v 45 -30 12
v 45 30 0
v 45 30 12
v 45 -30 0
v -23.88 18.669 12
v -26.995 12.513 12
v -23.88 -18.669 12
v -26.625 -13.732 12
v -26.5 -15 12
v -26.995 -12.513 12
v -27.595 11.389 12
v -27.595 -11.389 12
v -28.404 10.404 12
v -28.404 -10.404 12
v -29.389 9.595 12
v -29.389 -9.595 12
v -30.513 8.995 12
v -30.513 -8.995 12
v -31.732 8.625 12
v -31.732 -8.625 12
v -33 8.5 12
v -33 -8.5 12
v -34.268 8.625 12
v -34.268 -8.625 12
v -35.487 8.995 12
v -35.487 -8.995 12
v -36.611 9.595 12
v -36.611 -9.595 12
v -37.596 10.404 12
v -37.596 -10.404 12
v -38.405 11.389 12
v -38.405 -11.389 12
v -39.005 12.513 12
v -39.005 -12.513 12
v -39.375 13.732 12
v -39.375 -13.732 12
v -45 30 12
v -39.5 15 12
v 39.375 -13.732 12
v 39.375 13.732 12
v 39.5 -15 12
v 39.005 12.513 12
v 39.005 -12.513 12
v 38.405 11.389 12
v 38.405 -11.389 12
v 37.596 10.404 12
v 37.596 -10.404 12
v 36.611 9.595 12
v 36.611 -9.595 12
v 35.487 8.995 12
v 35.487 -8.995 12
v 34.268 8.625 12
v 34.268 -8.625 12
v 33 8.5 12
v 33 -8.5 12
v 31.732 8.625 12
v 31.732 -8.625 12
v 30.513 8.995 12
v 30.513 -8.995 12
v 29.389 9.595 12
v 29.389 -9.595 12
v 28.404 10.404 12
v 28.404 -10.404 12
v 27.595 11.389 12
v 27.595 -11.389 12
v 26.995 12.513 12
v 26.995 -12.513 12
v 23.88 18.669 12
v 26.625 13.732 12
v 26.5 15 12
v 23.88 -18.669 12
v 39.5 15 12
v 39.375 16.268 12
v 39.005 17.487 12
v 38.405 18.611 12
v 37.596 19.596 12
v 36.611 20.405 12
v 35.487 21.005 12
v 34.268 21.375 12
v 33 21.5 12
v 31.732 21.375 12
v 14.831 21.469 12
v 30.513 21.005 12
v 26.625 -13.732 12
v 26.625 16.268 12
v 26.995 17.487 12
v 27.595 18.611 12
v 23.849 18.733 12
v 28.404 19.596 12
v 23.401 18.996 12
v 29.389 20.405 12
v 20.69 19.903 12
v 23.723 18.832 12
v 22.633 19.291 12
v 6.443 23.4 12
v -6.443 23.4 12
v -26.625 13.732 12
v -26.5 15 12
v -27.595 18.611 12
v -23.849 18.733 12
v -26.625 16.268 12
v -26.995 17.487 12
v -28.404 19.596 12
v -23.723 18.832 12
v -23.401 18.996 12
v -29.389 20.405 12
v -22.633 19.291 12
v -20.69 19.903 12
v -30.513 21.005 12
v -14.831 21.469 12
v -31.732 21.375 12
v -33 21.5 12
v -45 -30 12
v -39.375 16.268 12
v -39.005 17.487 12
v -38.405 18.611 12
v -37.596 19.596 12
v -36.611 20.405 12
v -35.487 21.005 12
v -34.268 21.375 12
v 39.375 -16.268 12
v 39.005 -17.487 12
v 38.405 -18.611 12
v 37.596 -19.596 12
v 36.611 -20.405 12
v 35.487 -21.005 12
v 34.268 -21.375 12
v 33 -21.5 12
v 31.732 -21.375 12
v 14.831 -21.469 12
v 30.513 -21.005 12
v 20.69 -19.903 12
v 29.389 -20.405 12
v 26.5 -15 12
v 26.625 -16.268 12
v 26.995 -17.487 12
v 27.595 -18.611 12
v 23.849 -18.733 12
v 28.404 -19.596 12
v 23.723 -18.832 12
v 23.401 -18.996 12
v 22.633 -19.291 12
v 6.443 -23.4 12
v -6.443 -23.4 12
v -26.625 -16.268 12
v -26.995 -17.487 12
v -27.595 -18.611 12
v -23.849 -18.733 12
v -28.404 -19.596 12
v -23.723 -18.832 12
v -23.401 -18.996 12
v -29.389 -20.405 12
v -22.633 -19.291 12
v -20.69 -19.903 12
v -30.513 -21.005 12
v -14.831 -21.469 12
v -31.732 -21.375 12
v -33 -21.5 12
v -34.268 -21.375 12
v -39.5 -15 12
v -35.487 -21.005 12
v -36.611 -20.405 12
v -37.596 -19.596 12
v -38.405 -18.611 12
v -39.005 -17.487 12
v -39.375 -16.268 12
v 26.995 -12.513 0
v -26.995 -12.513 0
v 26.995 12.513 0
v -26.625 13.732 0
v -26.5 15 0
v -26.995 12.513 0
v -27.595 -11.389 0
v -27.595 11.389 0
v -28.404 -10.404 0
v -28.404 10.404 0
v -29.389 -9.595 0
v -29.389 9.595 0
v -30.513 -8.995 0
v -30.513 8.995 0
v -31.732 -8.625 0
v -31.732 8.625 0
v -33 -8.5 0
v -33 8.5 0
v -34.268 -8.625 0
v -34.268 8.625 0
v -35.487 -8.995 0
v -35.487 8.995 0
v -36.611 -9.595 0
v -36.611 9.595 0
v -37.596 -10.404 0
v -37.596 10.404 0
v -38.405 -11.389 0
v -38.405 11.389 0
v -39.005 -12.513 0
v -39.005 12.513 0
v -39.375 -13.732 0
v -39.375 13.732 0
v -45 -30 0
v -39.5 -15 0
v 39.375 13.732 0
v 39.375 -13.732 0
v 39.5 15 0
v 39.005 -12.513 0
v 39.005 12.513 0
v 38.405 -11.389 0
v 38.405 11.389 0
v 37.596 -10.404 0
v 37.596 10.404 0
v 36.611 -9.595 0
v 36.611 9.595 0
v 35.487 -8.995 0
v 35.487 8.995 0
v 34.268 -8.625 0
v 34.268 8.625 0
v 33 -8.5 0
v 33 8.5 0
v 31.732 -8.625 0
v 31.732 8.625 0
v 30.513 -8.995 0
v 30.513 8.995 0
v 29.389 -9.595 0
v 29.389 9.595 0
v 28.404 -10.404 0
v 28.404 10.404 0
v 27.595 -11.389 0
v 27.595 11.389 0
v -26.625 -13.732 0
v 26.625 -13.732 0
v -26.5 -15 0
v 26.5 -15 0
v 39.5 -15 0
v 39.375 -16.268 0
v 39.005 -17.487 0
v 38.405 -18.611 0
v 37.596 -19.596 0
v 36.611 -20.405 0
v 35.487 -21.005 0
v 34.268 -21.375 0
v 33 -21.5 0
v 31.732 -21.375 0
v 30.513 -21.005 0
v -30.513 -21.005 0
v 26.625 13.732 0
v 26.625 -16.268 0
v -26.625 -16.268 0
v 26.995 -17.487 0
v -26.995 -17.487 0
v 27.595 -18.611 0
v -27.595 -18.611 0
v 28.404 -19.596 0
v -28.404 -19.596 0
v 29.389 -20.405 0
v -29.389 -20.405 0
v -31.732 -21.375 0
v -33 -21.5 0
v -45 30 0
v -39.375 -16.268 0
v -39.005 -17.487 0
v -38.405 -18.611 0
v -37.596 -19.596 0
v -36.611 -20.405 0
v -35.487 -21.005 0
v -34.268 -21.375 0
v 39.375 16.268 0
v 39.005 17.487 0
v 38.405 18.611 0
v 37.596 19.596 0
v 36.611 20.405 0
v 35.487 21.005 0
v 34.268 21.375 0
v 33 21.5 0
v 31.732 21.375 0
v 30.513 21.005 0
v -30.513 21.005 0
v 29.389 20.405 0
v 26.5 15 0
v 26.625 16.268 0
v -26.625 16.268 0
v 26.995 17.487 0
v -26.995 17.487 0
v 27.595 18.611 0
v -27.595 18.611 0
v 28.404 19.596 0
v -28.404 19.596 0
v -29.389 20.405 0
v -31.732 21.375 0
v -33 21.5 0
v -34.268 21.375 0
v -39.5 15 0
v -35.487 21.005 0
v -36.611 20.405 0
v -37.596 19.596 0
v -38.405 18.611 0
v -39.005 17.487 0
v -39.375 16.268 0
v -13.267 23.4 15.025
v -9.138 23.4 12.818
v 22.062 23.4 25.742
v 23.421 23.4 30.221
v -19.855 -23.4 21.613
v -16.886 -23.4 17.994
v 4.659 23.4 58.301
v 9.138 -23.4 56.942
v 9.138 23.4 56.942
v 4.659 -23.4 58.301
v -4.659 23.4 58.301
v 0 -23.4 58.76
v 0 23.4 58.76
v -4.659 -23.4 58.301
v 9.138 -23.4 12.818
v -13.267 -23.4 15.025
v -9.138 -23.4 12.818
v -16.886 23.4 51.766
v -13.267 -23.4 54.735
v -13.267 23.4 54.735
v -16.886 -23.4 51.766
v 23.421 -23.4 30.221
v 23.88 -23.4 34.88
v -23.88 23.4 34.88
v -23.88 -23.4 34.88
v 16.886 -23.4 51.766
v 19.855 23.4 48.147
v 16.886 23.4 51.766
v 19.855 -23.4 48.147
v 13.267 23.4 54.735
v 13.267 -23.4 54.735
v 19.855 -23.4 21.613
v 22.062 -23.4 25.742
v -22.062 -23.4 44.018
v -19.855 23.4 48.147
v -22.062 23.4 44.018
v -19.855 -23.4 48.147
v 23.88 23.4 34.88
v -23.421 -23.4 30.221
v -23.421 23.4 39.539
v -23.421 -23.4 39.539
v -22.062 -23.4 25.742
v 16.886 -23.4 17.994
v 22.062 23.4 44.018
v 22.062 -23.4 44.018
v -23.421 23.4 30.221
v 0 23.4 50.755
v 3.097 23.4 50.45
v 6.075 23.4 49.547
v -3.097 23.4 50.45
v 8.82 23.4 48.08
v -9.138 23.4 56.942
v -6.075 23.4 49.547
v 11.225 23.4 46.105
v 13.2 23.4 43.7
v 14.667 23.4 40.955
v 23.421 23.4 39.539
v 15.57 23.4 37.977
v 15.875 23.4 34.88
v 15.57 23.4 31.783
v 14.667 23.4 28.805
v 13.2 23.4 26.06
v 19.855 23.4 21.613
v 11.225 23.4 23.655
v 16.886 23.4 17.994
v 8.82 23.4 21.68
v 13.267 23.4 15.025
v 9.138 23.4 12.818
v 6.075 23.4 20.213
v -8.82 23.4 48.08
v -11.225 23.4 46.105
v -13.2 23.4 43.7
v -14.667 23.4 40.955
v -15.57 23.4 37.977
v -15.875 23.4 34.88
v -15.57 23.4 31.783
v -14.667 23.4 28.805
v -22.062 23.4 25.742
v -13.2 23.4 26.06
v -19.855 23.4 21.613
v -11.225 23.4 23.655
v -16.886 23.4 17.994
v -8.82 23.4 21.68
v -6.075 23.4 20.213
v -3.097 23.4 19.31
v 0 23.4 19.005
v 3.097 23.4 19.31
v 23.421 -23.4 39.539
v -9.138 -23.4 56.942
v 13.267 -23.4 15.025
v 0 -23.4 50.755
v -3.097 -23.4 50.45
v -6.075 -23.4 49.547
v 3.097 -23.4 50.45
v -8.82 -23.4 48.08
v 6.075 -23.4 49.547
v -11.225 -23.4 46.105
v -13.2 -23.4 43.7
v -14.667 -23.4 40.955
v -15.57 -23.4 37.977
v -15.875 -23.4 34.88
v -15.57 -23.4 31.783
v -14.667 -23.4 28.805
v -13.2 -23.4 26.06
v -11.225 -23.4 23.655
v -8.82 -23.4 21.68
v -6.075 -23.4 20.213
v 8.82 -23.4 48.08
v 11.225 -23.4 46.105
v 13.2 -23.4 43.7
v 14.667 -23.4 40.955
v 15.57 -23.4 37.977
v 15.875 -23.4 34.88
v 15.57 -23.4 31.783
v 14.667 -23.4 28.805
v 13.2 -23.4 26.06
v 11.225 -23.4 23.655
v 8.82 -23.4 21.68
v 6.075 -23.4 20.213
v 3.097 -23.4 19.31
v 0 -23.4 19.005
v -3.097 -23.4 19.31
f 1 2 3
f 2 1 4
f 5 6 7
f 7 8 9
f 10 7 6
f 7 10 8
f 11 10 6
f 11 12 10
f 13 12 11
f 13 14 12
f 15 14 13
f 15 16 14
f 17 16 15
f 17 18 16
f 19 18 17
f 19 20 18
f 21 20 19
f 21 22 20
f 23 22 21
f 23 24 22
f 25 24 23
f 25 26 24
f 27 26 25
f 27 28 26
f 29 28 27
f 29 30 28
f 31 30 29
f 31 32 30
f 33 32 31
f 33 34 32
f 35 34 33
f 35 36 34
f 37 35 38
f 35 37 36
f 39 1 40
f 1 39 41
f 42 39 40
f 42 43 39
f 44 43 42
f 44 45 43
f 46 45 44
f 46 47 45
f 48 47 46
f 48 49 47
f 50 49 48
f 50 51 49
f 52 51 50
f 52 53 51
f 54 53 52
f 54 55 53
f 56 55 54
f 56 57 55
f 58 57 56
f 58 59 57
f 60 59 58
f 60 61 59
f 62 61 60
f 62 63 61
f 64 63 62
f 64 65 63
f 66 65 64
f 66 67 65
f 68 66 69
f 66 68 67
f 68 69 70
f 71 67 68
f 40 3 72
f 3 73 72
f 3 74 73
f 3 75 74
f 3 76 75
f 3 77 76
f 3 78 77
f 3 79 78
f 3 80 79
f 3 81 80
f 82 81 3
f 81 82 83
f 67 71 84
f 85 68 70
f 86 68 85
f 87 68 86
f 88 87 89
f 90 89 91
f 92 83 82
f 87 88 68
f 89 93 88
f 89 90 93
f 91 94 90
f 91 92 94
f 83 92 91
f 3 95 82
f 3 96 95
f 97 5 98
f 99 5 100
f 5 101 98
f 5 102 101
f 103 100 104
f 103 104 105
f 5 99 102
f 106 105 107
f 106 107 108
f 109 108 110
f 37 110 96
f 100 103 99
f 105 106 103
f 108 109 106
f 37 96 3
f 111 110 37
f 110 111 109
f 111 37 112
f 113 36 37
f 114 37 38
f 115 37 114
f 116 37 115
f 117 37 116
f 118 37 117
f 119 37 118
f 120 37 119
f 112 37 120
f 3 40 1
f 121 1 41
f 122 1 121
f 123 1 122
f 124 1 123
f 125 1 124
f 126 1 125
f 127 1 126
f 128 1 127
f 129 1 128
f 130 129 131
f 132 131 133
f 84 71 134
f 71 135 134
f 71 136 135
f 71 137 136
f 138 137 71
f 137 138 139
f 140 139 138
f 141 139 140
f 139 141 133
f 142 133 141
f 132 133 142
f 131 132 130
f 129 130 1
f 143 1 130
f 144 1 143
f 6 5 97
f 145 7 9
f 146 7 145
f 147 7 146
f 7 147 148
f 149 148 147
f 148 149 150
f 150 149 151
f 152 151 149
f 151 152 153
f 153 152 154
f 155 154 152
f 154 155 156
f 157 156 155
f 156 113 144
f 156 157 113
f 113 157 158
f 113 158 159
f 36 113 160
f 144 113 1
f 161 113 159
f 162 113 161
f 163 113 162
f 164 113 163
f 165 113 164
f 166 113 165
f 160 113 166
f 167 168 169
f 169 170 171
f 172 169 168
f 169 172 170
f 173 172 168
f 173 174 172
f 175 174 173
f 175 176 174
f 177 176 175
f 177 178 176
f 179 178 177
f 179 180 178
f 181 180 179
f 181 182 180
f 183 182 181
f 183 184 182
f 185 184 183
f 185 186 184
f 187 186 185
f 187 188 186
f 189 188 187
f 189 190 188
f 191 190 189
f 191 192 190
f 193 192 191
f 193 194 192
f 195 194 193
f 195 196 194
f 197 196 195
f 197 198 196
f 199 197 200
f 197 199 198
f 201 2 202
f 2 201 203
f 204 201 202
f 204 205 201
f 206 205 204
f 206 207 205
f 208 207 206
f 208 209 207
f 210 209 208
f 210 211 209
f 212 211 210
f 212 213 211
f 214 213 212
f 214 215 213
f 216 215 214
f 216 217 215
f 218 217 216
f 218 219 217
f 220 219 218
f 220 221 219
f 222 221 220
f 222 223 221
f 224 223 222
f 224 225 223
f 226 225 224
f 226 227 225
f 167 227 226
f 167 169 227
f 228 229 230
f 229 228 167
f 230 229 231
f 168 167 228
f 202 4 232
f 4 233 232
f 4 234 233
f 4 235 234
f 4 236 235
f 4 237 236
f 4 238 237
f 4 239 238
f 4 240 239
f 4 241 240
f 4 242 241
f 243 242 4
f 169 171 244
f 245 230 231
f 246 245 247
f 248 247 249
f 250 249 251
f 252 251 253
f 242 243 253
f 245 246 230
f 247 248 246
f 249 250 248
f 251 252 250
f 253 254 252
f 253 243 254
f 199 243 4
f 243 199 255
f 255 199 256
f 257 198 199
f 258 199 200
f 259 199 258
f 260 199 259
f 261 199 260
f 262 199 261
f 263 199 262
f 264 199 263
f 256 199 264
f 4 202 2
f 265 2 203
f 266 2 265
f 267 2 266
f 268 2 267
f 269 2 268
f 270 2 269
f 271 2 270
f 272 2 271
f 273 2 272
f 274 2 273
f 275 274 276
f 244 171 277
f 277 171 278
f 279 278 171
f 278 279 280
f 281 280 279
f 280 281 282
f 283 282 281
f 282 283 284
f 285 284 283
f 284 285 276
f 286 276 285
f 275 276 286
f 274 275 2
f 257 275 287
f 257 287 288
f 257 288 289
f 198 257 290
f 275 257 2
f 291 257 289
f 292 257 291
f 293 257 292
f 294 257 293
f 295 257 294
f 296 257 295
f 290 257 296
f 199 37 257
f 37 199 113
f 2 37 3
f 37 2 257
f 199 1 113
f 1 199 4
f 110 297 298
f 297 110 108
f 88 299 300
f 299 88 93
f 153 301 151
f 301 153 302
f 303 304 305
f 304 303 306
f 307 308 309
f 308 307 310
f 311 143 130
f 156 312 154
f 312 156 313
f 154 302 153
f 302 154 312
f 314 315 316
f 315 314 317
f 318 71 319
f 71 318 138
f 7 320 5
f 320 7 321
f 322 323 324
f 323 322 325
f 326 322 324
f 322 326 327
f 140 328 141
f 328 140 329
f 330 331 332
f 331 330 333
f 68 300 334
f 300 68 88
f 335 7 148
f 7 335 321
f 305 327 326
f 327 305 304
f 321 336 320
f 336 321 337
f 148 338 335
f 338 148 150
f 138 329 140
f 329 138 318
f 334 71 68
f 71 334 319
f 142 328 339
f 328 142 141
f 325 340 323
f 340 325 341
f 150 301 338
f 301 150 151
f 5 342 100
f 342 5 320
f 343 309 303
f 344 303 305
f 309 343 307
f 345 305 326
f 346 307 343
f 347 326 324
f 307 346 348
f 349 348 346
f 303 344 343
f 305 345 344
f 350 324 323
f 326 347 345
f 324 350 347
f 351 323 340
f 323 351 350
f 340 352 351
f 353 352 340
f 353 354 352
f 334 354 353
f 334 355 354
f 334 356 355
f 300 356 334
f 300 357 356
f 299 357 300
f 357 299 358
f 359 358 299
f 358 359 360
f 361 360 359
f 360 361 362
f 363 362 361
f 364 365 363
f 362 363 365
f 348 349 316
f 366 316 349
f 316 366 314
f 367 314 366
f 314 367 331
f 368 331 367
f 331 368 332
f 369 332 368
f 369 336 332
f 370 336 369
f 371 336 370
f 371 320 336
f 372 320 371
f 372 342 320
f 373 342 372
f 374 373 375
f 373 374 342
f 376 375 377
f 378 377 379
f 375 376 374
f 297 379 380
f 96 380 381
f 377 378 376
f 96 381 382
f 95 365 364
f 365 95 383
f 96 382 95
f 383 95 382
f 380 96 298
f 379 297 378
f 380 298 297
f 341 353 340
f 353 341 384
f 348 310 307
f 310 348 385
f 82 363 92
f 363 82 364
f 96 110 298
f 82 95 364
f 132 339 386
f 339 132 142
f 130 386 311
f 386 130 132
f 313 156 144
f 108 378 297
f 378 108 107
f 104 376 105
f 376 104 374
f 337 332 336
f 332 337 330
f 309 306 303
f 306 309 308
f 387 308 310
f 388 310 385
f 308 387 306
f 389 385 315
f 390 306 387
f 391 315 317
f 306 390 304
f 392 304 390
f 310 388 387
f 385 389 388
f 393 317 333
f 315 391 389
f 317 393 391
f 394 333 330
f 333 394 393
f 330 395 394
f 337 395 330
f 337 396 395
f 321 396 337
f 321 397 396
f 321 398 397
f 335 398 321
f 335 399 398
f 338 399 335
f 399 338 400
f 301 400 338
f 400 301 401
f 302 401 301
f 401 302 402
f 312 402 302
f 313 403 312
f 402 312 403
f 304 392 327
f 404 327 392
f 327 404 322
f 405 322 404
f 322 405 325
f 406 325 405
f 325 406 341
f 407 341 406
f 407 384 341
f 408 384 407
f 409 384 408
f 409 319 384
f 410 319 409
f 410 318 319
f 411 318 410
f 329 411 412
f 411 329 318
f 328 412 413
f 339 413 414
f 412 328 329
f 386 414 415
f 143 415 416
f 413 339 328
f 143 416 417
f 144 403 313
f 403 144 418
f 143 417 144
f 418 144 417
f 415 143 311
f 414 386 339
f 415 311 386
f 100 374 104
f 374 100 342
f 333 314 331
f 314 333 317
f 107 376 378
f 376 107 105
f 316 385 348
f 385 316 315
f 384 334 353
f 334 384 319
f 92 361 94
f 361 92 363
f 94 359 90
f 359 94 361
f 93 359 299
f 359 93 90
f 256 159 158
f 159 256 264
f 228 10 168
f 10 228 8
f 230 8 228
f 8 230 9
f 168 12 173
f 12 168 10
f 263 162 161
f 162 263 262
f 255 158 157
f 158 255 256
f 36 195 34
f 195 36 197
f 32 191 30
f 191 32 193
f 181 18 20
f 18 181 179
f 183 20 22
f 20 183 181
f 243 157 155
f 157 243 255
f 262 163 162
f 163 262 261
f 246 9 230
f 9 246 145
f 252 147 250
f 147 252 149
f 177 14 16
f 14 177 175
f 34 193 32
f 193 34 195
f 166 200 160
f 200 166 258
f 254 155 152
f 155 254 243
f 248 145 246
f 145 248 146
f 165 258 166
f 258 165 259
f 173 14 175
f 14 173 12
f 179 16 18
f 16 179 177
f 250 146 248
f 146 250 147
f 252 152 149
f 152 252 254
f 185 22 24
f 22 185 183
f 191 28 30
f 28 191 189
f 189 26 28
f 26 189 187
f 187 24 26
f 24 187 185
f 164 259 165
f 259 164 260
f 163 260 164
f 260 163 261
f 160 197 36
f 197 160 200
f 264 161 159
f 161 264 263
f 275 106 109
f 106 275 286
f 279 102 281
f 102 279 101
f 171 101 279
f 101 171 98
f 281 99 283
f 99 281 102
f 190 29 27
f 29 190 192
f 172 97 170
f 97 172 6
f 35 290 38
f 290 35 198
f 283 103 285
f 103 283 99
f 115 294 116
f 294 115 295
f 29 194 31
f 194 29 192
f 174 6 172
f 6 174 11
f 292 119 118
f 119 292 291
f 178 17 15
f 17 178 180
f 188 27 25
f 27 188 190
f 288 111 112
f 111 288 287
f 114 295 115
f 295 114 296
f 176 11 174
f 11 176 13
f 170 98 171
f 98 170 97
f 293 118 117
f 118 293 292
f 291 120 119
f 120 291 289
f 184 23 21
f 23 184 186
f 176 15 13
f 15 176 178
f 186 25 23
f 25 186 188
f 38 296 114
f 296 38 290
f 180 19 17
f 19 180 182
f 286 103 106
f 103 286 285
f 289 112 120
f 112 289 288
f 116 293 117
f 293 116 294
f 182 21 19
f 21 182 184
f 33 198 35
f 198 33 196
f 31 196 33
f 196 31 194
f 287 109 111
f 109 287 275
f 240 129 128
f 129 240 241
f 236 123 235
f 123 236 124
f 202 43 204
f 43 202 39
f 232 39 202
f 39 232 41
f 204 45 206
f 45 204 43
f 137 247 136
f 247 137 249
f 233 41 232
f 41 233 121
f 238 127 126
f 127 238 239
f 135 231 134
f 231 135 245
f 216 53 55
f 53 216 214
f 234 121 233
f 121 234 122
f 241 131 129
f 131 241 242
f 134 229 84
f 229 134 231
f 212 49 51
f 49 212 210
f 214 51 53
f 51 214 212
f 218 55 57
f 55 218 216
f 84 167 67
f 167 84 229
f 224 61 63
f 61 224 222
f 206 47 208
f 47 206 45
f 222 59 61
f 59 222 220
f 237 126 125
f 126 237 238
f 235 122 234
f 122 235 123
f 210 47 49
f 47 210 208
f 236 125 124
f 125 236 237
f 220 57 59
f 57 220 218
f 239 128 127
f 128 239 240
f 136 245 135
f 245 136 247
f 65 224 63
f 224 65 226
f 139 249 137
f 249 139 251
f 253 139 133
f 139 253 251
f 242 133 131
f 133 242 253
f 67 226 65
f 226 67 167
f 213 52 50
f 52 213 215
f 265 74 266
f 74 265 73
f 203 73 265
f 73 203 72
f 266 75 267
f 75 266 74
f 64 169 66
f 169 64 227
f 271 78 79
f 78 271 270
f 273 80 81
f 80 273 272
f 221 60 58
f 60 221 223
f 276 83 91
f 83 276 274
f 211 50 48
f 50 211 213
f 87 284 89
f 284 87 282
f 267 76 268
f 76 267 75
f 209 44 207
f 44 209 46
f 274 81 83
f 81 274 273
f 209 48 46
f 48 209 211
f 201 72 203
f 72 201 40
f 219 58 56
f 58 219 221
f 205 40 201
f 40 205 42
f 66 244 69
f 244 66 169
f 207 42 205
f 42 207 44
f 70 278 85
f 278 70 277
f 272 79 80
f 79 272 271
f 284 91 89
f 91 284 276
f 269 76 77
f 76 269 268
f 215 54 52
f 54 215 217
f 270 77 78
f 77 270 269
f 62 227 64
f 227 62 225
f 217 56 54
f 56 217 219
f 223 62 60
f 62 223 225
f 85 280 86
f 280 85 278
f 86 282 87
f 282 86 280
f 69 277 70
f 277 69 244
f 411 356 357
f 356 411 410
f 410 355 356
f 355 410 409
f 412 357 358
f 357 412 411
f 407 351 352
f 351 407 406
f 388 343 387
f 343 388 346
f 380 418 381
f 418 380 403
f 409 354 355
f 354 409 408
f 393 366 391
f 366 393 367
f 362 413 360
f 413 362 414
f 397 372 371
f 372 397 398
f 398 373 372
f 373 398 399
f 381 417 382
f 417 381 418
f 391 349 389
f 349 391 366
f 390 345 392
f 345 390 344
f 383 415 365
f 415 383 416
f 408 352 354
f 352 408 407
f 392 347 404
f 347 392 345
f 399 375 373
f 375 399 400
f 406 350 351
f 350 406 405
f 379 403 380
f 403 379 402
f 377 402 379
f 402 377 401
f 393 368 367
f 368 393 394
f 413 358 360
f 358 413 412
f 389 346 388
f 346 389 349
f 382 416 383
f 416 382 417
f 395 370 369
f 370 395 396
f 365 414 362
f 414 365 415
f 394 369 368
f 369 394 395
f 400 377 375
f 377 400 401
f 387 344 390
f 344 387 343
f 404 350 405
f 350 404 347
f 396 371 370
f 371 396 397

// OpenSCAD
$fn = 32;

// ----------------------------------------------------------------------
// Bearing block: 90 x 60 mm base, 31.75 mm bore at 34.88 mm
// ----------------------------------------------------------------------

// --- parameters (mm) ---
base_w = 90;              // base width
base_d = 60;              // base depth
base_t = 12;              // base thickness
bore_d = 31.75;           // shaft / bearing bore
house_r = 23.88;          // housing outer radius
house_len = 46.8;         // housing length along the shaft
foot_w = 47.76;           // foot width under the housing
foot_len = 36.8;          // foot length along the shaft
axis_z = 34.88;           // bore axis height above the base
holes_d = 13;             // mounting holes
hole_x = 33;              // mounting hole spacing

difference() {
  union() {
    /* base plate with its underside on z = 0 */
    translate([0, 0, base_t / 2]) cube([base_w, base_d, base_t], center = true);
    /* hull foot: a straight web blending into the round housing */
    hull() {
      translate([0, 0, base_t - 0.5]) cube([foot_w, foot_len, 1.6], center = true);
      translate([0, 0, axis_z]) rotate([-90, 0, 0]) cylinder(h = house_len, d = 2 * house_r, center = true);
    }
  }
  /* bore through the housing, 2.5 mm clear on both sides */
  translate([0, 0, axis_z]) rotate([-90, 0, 0]) cylinder(h = house_len + 5, d = bore_d, center = true);
  /* mounting holes through the base plate */
  for (hx = [-33, 33]) {
    for (hy = [-15, 15]) {
      translate([hx, hy, -2.5]) cylinder(h = base_t + 5, d = holes_d);
    }
  }
}
